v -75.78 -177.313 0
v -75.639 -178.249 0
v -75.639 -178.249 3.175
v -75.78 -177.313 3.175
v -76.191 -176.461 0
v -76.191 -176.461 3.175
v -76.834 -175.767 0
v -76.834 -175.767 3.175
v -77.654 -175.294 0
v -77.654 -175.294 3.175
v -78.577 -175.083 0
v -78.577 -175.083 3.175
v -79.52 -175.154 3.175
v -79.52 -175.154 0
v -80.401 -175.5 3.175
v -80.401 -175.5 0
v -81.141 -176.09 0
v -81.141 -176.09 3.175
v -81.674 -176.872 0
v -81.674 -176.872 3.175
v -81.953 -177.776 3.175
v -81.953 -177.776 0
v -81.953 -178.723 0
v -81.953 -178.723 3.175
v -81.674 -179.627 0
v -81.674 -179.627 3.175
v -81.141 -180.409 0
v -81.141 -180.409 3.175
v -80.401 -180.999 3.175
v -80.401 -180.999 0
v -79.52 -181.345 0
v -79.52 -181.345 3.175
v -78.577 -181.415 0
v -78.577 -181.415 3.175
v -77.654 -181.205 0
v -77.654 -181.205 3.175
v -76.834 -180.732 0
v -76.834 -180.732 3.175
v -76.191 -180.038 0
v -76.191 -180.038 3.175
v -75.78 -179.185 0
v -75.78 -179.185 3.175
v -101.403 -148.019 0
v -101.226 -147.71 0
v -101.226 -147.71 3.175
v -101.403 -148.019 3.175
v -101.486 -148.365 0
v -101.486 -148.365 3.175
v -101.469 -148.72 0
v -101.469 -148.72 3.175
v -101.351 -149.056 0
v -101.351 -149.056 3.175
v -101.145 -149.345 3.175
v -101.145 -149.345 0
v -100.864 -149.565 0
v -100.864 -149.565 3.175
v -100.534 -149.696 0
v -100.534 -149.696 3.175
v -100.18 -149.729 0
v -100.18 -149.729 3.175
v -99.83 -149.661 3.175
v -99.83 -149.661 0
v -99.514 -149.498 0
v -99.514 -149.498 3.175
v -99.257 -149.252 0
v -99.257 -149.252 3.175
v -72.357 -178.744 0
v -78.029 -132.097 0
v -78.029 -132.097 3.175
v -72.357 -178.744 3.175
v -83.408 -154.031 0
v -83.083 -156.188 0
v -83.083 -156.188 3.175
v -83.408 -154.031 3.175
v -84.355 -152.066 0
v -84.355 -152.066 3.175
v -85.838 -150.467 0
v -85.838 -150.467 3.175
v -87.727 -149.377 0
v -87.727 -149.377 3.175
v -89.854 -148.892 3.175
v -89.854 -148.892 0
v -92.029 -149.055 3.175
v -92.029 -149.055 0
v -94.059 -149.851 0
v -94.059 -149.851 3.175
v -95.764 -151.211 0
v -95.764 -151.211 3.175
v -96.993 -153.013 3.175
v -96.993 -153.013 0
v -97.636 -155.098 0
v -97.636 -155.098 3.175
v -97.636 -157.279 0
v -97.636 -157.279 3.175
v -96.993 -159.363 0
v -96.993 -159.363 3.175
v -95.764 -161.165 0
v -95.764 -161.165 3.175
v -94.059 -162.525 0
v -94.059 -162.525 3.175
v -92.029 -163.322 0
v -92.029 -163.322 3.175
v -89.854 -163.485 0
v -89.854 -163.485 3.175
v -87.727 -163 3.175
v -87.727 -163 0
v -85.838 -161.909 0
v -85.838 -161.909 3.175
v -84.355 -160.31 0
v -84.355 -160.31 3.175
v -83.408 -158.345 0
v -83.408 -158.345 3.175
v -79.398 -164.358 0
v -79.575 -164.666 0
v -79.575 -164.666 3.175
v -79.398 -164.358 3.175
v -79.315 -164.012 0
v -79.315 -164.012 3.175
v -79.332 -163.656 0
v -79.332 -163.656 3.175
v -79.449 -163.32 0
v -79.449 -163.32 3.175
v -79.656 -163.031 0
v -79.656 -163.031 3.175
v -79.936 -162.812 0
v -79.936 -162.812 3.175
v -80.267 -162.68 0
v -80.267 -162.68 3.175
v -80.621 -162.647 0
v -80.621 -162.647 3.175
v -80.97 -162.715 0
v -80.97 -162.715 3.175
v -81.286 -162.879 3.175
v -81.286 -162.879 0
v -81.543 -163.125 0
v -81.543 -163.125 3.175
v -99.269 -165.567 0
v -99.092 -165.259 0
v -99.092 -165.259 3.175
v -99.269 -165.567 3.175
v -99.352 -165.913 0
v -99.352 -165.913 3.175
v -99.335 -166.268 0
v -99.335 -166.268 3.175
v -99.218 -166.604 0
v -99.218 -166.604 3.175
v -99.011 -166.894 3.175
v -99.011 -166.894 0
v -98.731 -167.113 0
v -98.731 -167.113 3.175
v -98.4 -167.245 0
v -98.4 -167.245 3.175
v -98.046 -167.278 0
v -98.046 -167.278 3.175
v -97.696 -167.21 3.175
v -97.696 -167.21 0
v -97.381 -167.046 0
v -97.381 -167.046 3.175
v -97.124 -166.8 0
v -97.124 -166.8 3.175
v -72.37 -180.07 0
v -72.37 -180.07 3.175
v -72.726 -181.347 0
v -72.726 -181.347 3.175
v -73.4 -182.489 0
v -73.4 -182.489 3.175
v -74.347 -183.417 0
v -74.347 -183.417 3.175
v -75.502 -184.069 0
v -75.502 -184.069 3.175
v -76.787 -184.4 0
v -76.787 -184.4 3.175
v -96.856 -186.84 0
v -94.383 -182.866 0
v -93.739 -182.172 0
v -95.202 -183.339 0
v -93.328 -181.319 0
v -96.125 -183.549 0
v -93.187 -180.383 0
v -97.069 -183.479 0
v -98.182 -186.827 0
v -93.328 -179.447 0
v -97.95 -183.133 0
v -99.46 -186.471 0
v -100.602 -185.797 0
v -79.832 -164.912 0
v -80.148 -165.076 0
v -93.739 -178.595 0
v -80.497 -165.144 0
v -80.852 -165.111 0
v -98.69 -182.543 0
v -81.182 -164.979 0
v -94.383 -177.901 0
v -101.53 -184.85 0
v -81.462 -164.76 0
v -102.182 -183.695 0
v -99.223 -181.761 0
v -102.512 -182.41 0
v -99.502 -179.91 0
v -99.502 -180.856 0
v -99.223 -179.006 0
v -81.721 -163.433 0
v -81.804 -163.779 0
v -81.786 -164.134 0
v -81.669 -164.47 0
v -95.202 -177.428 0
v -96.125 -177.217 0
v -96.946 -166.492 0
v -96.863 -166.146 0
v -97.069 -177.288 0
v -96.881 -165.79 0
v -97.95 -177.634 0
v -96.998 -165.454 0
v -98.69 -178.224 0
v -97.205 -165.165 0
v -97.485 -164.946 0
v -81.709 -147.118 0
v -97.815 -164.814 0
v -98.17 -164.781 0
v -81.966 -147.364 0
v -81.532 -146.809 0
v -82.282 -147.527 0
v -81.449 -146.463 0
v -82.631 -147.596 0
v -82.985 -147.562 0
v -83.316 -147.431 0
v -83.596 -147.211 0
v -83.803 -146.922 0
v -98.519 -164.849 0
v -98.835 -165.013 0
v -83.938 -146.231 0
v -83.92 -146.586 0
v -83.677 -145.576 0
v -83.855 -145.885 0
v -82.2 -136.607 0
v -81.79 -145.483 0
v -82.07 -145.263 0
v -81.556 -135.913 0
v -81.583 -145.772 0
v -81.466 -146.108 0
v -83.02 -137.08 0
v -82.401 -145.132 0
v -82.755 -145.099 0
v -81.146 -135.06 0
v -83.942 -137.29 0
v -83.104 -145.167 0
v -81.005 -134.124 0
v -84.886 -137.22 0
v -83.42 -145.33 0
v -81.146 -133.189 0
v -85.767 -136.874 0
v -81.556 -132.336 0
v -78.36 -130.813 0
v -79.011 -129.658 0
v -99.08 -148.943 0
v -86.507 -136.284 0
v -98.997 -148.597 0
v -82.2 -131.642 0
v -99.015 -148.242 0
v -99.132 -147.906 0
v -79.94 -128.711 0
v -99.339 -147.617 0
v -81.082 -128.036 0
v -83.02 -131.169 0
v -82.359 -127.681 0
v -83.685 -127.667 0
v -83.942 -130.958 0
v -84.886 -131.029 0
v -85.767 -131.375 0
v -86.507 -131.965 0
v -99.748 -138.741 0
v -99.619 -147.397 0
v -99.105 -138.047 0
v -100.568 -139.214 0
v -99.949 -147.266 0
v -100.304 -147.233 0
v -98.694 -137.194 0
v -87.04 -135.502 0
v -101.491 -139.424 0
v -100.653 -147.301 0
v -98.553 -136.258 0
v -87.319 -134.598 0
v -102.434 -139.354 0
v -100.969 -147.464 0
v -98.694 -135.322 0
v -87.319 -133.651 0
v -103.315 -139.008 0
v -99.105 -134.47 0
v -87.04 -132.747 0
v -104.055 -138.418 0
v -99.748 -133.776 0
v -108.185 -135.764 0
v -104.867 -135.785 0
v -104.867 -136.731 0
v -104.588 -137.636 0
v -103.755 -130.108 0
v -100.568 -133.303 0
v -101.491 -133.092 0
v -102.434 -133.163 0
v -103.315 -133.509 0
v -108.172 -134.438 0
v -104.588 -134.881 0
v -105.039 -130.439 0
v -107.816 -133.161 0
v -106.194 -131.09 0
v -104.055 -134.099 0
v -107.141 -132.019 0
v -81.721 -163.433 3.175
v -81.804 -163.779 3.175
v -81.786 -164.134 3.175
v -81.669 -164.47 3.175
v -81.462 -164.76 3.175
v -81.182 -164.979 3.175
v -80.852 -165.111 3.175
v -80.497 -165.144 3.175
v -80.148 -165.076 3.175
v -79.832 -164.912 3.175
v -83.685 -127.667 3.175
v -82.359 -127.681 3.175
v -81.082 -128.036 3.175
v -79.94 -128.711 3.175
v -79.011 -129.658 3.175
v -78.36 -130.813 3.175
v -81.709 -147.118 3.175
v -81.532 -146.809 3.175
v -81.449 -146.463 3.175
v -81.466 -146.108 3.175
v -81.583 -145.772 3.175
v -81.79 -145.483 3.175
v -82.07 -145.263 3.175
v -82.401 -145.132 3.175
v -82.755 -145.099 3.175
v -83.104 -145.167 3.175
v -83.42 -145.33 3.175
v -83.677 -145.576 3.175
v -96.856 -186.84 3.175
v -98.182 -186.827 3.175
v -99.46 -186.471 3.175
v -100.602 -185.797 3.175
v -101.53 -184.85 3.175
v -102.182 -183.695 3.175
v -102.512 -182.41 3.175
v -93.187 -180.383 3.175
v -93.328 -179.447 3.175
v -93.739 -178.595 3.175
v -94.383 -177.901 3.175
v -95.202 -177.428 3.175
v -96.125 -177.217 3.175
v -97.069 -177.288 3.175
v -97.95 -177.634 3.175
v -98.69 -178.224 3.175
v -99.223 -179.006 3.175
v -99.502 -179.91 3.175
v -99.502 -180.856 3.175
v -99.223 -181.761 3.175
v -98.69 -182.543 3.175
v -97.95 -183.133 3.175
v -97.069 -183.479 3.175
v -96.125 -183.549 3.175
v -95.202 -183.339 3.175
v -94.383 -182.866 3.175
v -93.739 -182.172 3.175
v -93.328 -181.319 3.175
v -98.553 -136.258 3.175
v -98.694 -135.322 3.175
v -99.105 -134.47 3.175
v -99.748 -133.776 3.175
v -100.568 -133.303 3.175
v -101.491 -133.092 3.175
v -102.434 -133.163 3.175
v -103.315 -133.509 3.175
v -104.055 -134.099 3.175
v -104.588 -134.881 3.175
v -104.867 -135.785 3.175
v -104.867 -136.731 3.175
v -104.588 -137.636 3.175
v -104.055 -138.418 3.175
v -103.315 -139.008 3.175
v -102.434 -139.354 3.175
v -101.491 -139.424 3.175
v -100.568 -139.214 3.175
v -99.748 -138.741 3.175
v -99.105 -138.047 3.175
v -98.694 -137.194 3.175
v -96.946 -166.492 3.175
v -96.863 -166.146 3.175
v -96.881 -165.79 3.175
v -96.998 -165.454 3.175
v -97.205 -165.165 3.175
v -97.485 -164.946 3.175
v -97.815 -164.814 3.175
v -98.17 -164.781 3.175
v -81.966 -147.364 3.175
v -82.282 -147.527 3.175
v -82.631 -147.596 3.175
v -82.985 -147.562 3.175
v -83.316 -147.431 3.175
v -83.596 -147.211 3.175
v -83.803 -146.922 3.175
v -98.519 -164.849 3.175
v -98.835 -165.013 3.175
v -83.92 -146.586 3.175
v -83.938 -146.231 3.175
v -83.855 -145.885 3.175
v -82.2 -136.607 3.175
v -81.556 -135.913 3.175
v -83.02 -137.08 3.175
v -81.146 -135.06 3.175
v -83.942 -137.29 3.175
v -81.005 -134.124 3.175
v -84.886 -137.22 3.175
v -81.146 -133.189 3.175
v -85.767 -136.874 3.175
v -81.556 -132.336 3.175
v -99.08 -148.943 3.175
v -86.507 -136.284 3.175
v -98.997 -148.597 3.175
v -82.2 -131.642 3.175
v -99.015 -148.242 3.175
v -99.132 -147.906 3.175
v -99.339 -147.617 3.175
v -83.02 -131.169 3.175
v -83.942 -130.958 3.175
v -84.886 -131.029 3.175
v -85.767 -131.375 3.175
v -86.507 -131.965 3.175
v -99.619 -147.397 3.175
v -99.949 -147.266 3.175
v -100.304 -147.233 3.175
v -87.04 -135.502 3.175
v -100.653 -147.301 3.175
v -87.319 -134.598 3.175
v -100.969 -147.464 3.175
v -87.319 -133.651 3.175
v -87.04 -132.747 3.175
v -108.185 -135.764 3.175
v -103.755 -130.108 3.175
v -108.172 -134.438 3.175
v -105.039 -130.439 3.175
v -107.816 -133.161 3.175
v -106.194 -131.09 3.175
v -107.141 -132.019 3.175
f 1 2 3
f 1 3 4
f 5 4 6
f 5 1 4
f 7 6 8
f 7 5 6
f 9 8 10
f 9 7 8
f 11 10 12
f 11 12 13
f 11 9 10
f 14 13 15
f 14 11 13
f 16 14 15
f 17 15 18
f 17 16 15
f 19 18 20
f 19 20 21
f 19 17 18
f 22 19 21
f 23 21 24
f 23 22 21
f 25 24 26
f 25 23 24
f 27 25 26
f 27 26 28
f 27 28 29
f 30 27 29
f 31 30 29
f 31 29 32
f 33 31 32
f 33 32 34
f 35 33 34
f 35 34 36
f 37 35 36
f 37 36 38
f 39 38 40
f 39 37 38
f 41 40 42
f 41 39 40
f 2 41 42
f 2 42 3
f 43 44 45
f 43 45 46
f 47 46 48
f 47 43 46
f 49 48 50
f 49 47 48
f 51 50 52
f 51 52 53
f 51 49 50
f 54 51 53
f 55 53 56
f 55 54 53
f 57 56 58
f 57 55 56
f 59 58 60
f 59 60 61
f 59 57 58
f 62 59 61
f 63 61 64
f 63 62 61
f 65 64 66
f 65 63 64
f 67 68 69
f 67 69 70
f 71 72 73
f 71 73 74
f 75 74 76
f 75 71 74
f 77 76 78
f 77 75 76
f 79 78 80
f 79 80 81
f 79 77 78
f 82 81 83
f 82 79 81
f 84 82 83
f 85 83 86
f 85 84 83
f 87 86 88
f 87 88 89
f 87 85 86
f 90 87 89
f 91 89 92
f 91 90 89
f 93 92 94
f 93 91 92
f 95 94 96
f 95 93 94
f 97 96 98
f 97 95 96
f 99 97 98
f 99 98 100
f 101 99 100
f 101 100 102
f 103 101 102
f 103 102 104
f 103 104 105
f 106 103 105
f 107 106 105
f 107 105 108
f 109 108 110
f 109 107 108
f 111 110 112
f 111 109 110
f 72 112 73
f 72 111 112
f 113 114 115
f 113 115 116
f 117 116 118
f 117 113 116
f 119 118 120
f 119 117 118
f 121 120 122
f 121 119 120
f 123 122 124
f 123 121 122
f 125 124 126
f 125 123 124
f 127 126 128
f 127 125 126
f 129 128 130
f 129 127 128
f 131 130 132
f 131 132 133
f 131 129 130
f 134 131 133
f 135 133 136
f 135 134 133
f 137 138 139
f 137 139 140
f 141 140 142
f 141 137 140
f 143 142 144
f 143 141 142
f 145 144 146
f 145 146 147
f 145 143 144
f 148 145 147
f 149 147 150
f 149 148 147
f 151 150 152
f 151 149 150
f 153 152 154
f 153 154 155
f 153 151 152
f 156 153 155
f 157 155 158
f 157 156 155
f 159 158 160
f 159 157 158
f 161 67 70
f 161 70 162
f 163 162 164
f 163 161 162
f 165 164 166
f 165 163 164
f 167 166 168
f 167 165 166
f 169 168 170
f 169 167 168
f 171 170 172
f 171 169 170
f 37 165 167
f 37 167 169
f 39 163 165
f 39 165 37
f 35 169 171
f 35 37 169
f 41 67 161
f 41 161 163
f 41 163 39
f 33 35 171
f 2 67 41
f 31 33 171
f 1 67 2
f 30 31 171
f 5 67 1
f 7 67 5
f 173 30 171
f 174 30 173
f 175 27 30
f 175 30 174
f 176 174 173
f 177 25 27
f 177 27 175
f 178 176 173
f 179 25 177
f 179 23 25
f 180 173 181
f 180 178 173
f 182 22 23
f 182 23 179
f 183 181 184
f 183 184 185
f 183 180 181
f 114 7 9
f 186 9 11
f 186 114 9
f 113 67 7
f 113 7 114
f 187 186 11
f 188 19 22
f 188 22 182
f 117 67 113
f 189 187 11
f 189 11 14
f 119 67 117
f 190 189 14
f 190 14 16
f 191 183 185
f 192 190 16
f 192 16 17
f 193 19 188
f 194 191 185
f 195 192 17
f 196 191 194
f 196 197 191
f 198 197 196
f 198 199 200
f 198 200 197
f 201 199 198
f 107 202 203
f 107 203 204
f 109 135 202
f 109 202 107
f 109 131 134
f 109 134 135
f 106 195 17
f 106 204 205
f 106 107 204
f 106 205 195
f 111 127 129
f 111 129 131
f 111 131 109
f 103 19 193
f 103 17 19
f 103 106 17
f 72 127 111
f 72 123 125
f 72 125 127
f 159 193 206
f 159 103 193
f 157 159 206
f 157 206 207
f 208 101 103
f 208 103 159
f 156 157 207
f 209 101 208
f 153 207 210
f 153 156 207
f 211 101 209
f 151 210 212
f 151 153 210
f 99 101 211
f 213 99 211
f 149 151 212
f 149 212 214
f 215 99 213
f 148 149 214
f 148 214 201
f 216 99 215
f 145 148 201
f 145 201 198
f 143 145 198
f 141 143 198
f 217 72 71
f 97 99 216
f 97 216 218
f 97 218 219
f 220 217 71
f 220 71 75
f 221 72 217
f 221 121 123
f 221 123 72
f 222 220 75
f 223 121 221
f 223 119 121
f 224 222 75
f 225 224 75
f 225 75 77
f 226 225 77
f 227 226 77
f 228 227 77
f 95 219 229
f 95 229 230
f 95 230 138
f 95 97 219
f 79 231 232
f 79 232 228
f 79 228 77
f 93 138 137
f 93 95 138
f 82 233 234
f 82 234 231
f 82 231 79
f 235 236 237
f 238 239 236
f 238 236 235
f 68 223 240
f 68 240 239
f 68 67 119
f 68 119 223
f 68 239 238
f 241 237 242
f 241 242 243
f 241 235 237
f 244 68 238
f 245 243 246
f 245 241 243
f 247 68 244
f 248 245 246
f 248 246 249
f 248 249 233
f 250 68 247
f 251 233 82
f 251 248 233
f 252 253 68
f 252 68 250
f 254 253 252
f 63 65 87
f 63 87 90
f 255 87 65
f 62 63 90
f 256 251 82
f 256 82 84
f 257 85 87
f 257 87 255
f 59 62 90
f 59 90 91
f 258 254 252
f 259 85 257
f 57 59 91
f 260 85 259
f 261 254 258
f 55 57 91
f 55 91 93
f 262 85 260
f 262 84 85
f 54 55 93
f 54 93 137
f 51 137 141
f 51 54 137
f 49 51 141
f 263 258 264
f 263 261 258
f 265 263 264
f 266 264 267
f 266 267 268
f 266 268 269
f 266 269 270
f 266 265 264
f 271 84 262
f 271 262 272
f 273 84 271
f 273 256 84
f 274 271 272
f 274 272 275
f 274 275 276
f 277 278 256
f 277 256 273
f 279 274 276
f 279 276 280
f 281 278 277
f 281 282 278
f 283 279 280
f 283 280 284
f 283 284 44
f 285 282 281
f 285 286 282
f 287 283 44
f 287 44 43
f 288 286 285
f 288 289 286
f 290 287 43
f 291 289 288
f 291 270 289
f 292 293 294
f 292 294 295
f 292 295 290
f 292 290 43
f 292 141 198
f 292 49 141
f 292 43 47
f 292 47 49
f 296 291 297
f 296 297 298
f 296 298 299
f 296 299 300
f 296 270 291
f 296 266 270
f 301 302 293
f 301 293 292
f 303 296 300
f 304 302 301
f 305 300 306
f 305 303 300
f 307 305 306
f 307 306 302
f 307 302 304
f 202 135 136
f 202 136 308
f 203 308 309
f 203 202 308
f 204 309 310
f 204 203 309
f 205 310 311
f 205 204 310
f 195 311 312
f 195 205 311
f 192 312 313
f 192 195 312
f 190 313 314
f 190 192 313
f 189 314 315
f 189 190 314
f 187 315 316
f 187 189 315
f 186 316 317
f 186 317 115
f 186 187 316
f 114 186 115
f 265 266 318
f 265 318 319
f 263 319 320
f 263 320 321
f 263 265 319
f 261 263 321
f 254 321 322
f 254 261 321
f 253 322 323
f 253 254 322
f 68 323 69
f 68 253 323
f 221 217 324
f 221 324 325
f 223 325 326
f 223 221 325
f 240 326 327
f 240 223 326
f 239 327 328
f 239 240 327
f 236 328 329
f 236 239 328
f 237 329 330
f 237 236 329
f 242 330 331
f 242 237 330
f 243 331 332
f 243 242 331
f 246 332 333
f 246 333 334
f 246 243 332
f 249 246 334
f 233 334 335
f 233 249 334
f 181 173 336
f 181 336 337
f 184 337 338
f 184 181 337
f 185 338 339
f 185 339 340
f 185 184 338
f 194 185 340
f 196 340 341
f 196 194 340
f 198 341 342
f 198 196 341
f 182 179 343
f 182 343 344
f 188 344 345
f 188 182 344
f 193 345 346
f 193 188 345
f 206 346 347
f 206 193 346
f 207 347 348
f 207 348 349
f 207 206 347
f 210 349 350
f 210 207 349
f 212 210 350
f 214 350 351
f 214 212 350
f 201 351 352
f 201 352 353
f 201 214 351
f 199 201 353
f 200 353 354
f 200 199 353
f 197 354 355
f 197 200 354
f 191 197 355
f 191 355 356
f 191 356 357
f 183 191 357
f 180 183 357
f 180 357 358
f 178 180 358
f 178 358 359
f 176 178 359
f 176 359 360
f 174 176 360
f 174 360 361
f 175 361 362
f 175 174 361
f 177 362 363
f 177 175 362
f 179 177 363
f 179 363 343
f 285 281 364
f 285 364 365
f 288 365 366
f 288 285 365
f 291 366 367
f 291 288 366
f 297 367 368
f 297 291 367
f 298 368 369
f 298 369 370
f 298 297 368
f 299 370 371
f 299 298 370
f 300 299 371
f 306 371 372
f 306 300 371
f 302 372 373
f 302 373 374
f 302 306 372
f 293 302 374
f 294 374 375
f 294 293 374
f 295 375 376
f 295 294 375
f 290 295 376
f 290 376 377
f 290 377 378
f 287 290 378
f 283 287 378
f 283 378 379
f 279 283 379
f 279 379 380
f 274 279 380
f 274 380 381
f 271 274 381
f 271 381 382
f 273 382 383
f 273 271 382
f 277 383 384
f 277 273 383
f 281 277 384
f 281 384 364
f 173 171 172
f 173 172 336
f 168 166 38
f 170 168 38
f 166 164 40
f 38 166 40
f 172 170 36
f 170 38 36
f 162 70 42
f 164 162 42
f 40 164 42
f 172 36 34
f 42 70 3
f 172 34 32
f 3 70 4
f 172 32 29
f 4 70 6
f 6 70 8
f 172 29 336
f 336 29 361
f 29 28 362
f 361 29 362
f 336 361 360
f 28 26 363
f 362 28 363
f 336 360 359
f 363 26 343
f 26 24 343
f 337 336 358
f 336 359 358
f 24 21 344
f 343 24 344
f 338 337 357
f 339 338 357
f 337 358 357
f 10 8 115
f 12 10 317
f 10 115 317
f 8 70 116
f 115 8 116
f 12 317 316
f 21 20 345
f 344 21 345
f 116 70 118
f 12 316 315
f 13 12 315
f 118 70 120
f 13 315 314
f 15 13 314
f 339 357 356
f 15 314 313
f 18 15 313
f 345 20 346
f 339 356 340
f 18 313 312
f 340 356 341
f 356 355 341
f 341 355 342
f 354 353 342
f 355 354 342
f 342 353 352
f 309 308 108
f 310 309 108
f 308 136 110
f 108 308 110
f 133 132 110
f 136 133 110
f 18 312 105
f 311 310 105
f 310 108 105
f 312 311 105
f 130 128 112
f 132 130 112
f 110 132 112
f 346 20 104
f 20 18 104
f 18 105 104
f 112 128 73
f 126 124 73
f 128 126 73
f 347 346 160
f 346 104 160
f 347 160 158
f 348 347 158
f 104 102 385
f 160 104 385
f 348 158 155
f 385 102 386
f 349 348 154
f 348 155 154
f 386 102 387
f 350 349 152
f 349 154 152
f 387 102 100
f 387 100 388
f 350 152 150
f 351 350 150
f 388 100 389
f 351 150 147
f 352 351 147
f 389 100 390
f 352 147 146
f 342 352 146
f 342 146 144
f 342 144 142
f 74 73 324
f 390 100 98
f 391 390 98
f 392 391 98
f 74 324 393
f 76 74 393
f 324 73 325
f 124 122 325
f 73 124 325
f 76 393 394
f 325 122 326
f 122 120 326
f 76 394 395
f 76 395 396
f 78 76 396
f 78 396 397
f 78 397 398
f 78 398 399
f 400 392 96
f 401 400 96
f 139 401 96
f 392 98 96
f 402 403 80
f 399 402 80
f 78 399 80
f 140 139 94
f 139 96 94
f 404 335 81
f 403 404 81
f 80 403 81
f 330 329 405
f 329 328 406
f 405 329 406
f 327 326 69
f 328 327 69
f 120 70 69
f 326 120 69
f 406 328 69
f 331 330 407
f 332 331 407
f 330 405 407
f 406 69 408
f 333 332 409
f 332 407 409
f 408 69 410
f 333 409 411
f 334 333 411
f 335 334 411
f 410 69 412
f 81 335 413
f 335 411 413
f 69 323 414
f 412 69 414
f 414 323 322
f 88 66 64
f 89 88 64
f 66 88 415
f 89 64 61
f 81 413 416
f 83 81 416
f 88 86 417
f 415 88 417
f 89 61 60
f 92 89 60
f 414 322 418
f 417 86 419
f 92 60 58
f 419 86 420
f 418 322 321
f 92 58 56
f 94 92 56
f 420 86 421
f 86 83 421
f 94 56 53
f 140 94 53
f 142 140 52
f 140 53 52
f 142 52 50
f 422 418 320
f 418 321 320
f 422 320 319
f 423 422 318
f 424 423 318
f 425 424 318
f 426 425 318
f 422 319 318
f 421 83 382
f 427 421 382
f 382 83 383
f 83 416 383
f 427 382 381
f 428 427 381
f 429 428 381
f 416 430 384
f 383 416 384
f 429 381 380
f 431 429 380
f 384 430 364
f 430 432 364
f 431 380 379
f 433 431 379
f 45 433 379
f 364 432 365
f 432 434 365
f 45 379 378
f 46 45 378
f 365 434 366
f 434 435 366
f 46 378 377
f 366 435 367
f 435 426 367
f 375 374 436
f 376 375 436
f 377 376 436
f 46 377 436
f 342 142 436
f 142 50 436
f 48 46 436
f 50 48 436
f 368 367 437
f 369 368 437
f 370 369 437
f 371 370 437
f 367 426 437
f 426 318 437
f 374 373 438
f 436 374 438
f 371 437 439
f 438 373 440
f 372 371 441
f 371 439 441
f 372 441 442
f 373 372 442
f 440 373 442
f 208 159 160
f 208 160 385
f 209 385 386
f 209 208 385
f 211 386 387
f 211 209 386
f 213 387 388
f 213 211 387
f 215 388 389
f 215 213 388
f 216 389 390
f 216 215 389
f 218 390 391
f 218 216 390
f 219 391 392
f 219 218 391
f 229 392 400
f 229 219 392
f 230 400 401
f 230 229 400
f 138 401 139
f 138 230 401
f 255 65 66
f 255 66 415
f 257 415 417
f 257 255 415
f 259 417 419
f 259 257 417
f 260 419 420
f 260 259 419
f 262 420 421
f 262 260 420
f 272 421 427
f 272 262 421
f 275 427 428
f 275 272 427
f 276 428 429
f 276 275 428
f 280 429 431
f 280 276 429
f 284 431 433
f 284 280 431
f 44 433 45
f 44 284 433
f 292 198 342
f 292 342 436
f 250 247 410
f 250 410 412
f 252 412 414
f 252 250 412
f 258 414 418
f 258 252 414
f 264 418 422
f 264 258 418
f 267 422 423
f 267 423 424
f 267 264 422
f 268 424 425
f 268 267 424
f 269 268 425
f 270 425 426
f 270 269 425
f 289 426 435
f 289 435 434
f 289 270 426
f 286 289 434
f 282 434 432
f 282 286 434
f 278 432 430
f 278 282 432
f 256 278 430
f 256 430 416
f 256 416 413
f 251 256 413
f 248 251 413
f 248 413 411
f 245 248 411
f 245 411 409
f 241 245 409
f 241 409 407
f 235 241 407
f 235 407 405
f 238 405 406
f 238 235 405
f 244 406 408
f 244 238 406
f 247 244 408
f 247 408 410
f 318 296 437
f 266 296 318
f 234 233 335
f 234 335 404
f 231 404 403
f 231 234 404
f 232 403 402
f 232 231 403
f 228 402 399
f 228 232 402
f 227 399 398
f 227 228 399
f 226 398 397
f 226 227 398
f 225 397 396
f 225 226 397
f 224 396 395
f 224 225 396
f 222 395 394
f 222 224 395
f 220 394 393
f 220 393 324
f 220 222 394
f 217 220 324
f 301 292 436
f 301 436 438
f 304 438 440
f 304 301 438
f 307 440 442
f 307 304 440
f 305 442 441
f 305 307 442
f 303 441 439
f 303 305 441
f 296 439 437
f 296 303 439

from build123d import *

# Parameters (mm, degrees)
SKETCH1_R           = 7.317167392
SKETCH1_R_2         = 3.175
BOSS_EXTRUDE2_DEPTH = 3.175


with BuildPart() as part:
    # Sketch1 → Boss-Extrude2 (new body)
    with BuildSketch(Plane.XY):
        with BuildLine():
            ThreePointArc((-108.18478159, -135.764097779), (-107.141377815, -132.018654189), (-103.75515137, -130.108023512))
            Line((-103.75515137, -130.108023512), (-83.685324569, -127.667488038))
            ThreePointArc((-83.685324569, -127.667488038), (-79.939880979, -128.710891812), (-78.029250302, -132.097118258))
            Line((-78.029250302, -132.097118258), (-72.356946589, -178.743501511))
            ThreePointArc((-72.356946589, -178.743501511), (-73.400350364, -182.488945101), (-76.78657681, -184.399575778))
            Line((-76.78657681, -184.399575778), (-96.85640361, -186.840111252))
            ThreePointArc((-96.85640361, -186.840111252), (-100.6018472, -185.796707477), (-102.512477877, -182.410481032))
            Line((-102.512477877, -182.410481032), (-108.18478159, -135.764097779))
        make_face()
        with Locations((-90.400440681, -156.188222118)):
            Circle(SKETCH1_R, mode=Mode.SUBTRACT)
        with Locations((-96.362218078, -180.383240442)):
            Circle(SKETCH1_R_2, mode=Mode.SUBTRACT)
        with Locations((-78.813817399, -178.249315979)):
            Circle(SKETCH1_R_2, mode=Mode.SUBTRACT)
        with Locations((-84.179510101, -134.124358848)):
            Circle(SKETCH1_R_2, mode=Mode.SUBTRACT)
        with Locations((-101.72791078, -136.258283311)):
            Circle(SKETCH1_R_2, mode=Mode.SUBTRACT)
        with BuildLine():
            ThreePointArc((-99.257486995, -149.251707821), (-99.470879442, -147.496867753), (-101.225719509, -147.710260199))
            ThreePointArc((-101.225719509, -147.710260199), (-101.012327063, -149.465100267), (-99.257486995, -149.251707821))
        make_face(mode=Mode.SUBTRACT)
        with BuildLine():
            ThreePointArc((-83.677318831, -145.576335736), (-83.463926384, -147.331175804), (-81.709086316, -147.117783358))
            ThreePointArc((-81.709086316, -147.117783358), (-81.922478763, -145.36294329), (-83.677318831, -145.576335736))
        make_face(mode=Mode.SUBTRACT)
        with BuildLine():
            ThreePointArc((-79.575161853, -164.666184037), (-79.7885543, -162.911343969), (-81.543394368, -163.124736415))
            ThreePointArc((-81.543394368, -163.124736415), (-81.330001921, -164.879576483), (-79.575161853, -164.666184037))
        make_face(mode=Mode.SUBTRACT)
        with BuildLine():
            ThreePointArc((-99.091795046, -165.258660878), (-98.8784026, -167.013500946), (-97.123562532, -166.8001085))
            ThreePointArc((-97.123562532, -166.8001085), (-97.336954979, -165.045268432), (-99.091795046, -165.258660878))
        make_face(mode=Mode.SUBTRACT)
    extrude(amount=BOSS_EXTRUDE2_DEPTH)


solid = part.part
